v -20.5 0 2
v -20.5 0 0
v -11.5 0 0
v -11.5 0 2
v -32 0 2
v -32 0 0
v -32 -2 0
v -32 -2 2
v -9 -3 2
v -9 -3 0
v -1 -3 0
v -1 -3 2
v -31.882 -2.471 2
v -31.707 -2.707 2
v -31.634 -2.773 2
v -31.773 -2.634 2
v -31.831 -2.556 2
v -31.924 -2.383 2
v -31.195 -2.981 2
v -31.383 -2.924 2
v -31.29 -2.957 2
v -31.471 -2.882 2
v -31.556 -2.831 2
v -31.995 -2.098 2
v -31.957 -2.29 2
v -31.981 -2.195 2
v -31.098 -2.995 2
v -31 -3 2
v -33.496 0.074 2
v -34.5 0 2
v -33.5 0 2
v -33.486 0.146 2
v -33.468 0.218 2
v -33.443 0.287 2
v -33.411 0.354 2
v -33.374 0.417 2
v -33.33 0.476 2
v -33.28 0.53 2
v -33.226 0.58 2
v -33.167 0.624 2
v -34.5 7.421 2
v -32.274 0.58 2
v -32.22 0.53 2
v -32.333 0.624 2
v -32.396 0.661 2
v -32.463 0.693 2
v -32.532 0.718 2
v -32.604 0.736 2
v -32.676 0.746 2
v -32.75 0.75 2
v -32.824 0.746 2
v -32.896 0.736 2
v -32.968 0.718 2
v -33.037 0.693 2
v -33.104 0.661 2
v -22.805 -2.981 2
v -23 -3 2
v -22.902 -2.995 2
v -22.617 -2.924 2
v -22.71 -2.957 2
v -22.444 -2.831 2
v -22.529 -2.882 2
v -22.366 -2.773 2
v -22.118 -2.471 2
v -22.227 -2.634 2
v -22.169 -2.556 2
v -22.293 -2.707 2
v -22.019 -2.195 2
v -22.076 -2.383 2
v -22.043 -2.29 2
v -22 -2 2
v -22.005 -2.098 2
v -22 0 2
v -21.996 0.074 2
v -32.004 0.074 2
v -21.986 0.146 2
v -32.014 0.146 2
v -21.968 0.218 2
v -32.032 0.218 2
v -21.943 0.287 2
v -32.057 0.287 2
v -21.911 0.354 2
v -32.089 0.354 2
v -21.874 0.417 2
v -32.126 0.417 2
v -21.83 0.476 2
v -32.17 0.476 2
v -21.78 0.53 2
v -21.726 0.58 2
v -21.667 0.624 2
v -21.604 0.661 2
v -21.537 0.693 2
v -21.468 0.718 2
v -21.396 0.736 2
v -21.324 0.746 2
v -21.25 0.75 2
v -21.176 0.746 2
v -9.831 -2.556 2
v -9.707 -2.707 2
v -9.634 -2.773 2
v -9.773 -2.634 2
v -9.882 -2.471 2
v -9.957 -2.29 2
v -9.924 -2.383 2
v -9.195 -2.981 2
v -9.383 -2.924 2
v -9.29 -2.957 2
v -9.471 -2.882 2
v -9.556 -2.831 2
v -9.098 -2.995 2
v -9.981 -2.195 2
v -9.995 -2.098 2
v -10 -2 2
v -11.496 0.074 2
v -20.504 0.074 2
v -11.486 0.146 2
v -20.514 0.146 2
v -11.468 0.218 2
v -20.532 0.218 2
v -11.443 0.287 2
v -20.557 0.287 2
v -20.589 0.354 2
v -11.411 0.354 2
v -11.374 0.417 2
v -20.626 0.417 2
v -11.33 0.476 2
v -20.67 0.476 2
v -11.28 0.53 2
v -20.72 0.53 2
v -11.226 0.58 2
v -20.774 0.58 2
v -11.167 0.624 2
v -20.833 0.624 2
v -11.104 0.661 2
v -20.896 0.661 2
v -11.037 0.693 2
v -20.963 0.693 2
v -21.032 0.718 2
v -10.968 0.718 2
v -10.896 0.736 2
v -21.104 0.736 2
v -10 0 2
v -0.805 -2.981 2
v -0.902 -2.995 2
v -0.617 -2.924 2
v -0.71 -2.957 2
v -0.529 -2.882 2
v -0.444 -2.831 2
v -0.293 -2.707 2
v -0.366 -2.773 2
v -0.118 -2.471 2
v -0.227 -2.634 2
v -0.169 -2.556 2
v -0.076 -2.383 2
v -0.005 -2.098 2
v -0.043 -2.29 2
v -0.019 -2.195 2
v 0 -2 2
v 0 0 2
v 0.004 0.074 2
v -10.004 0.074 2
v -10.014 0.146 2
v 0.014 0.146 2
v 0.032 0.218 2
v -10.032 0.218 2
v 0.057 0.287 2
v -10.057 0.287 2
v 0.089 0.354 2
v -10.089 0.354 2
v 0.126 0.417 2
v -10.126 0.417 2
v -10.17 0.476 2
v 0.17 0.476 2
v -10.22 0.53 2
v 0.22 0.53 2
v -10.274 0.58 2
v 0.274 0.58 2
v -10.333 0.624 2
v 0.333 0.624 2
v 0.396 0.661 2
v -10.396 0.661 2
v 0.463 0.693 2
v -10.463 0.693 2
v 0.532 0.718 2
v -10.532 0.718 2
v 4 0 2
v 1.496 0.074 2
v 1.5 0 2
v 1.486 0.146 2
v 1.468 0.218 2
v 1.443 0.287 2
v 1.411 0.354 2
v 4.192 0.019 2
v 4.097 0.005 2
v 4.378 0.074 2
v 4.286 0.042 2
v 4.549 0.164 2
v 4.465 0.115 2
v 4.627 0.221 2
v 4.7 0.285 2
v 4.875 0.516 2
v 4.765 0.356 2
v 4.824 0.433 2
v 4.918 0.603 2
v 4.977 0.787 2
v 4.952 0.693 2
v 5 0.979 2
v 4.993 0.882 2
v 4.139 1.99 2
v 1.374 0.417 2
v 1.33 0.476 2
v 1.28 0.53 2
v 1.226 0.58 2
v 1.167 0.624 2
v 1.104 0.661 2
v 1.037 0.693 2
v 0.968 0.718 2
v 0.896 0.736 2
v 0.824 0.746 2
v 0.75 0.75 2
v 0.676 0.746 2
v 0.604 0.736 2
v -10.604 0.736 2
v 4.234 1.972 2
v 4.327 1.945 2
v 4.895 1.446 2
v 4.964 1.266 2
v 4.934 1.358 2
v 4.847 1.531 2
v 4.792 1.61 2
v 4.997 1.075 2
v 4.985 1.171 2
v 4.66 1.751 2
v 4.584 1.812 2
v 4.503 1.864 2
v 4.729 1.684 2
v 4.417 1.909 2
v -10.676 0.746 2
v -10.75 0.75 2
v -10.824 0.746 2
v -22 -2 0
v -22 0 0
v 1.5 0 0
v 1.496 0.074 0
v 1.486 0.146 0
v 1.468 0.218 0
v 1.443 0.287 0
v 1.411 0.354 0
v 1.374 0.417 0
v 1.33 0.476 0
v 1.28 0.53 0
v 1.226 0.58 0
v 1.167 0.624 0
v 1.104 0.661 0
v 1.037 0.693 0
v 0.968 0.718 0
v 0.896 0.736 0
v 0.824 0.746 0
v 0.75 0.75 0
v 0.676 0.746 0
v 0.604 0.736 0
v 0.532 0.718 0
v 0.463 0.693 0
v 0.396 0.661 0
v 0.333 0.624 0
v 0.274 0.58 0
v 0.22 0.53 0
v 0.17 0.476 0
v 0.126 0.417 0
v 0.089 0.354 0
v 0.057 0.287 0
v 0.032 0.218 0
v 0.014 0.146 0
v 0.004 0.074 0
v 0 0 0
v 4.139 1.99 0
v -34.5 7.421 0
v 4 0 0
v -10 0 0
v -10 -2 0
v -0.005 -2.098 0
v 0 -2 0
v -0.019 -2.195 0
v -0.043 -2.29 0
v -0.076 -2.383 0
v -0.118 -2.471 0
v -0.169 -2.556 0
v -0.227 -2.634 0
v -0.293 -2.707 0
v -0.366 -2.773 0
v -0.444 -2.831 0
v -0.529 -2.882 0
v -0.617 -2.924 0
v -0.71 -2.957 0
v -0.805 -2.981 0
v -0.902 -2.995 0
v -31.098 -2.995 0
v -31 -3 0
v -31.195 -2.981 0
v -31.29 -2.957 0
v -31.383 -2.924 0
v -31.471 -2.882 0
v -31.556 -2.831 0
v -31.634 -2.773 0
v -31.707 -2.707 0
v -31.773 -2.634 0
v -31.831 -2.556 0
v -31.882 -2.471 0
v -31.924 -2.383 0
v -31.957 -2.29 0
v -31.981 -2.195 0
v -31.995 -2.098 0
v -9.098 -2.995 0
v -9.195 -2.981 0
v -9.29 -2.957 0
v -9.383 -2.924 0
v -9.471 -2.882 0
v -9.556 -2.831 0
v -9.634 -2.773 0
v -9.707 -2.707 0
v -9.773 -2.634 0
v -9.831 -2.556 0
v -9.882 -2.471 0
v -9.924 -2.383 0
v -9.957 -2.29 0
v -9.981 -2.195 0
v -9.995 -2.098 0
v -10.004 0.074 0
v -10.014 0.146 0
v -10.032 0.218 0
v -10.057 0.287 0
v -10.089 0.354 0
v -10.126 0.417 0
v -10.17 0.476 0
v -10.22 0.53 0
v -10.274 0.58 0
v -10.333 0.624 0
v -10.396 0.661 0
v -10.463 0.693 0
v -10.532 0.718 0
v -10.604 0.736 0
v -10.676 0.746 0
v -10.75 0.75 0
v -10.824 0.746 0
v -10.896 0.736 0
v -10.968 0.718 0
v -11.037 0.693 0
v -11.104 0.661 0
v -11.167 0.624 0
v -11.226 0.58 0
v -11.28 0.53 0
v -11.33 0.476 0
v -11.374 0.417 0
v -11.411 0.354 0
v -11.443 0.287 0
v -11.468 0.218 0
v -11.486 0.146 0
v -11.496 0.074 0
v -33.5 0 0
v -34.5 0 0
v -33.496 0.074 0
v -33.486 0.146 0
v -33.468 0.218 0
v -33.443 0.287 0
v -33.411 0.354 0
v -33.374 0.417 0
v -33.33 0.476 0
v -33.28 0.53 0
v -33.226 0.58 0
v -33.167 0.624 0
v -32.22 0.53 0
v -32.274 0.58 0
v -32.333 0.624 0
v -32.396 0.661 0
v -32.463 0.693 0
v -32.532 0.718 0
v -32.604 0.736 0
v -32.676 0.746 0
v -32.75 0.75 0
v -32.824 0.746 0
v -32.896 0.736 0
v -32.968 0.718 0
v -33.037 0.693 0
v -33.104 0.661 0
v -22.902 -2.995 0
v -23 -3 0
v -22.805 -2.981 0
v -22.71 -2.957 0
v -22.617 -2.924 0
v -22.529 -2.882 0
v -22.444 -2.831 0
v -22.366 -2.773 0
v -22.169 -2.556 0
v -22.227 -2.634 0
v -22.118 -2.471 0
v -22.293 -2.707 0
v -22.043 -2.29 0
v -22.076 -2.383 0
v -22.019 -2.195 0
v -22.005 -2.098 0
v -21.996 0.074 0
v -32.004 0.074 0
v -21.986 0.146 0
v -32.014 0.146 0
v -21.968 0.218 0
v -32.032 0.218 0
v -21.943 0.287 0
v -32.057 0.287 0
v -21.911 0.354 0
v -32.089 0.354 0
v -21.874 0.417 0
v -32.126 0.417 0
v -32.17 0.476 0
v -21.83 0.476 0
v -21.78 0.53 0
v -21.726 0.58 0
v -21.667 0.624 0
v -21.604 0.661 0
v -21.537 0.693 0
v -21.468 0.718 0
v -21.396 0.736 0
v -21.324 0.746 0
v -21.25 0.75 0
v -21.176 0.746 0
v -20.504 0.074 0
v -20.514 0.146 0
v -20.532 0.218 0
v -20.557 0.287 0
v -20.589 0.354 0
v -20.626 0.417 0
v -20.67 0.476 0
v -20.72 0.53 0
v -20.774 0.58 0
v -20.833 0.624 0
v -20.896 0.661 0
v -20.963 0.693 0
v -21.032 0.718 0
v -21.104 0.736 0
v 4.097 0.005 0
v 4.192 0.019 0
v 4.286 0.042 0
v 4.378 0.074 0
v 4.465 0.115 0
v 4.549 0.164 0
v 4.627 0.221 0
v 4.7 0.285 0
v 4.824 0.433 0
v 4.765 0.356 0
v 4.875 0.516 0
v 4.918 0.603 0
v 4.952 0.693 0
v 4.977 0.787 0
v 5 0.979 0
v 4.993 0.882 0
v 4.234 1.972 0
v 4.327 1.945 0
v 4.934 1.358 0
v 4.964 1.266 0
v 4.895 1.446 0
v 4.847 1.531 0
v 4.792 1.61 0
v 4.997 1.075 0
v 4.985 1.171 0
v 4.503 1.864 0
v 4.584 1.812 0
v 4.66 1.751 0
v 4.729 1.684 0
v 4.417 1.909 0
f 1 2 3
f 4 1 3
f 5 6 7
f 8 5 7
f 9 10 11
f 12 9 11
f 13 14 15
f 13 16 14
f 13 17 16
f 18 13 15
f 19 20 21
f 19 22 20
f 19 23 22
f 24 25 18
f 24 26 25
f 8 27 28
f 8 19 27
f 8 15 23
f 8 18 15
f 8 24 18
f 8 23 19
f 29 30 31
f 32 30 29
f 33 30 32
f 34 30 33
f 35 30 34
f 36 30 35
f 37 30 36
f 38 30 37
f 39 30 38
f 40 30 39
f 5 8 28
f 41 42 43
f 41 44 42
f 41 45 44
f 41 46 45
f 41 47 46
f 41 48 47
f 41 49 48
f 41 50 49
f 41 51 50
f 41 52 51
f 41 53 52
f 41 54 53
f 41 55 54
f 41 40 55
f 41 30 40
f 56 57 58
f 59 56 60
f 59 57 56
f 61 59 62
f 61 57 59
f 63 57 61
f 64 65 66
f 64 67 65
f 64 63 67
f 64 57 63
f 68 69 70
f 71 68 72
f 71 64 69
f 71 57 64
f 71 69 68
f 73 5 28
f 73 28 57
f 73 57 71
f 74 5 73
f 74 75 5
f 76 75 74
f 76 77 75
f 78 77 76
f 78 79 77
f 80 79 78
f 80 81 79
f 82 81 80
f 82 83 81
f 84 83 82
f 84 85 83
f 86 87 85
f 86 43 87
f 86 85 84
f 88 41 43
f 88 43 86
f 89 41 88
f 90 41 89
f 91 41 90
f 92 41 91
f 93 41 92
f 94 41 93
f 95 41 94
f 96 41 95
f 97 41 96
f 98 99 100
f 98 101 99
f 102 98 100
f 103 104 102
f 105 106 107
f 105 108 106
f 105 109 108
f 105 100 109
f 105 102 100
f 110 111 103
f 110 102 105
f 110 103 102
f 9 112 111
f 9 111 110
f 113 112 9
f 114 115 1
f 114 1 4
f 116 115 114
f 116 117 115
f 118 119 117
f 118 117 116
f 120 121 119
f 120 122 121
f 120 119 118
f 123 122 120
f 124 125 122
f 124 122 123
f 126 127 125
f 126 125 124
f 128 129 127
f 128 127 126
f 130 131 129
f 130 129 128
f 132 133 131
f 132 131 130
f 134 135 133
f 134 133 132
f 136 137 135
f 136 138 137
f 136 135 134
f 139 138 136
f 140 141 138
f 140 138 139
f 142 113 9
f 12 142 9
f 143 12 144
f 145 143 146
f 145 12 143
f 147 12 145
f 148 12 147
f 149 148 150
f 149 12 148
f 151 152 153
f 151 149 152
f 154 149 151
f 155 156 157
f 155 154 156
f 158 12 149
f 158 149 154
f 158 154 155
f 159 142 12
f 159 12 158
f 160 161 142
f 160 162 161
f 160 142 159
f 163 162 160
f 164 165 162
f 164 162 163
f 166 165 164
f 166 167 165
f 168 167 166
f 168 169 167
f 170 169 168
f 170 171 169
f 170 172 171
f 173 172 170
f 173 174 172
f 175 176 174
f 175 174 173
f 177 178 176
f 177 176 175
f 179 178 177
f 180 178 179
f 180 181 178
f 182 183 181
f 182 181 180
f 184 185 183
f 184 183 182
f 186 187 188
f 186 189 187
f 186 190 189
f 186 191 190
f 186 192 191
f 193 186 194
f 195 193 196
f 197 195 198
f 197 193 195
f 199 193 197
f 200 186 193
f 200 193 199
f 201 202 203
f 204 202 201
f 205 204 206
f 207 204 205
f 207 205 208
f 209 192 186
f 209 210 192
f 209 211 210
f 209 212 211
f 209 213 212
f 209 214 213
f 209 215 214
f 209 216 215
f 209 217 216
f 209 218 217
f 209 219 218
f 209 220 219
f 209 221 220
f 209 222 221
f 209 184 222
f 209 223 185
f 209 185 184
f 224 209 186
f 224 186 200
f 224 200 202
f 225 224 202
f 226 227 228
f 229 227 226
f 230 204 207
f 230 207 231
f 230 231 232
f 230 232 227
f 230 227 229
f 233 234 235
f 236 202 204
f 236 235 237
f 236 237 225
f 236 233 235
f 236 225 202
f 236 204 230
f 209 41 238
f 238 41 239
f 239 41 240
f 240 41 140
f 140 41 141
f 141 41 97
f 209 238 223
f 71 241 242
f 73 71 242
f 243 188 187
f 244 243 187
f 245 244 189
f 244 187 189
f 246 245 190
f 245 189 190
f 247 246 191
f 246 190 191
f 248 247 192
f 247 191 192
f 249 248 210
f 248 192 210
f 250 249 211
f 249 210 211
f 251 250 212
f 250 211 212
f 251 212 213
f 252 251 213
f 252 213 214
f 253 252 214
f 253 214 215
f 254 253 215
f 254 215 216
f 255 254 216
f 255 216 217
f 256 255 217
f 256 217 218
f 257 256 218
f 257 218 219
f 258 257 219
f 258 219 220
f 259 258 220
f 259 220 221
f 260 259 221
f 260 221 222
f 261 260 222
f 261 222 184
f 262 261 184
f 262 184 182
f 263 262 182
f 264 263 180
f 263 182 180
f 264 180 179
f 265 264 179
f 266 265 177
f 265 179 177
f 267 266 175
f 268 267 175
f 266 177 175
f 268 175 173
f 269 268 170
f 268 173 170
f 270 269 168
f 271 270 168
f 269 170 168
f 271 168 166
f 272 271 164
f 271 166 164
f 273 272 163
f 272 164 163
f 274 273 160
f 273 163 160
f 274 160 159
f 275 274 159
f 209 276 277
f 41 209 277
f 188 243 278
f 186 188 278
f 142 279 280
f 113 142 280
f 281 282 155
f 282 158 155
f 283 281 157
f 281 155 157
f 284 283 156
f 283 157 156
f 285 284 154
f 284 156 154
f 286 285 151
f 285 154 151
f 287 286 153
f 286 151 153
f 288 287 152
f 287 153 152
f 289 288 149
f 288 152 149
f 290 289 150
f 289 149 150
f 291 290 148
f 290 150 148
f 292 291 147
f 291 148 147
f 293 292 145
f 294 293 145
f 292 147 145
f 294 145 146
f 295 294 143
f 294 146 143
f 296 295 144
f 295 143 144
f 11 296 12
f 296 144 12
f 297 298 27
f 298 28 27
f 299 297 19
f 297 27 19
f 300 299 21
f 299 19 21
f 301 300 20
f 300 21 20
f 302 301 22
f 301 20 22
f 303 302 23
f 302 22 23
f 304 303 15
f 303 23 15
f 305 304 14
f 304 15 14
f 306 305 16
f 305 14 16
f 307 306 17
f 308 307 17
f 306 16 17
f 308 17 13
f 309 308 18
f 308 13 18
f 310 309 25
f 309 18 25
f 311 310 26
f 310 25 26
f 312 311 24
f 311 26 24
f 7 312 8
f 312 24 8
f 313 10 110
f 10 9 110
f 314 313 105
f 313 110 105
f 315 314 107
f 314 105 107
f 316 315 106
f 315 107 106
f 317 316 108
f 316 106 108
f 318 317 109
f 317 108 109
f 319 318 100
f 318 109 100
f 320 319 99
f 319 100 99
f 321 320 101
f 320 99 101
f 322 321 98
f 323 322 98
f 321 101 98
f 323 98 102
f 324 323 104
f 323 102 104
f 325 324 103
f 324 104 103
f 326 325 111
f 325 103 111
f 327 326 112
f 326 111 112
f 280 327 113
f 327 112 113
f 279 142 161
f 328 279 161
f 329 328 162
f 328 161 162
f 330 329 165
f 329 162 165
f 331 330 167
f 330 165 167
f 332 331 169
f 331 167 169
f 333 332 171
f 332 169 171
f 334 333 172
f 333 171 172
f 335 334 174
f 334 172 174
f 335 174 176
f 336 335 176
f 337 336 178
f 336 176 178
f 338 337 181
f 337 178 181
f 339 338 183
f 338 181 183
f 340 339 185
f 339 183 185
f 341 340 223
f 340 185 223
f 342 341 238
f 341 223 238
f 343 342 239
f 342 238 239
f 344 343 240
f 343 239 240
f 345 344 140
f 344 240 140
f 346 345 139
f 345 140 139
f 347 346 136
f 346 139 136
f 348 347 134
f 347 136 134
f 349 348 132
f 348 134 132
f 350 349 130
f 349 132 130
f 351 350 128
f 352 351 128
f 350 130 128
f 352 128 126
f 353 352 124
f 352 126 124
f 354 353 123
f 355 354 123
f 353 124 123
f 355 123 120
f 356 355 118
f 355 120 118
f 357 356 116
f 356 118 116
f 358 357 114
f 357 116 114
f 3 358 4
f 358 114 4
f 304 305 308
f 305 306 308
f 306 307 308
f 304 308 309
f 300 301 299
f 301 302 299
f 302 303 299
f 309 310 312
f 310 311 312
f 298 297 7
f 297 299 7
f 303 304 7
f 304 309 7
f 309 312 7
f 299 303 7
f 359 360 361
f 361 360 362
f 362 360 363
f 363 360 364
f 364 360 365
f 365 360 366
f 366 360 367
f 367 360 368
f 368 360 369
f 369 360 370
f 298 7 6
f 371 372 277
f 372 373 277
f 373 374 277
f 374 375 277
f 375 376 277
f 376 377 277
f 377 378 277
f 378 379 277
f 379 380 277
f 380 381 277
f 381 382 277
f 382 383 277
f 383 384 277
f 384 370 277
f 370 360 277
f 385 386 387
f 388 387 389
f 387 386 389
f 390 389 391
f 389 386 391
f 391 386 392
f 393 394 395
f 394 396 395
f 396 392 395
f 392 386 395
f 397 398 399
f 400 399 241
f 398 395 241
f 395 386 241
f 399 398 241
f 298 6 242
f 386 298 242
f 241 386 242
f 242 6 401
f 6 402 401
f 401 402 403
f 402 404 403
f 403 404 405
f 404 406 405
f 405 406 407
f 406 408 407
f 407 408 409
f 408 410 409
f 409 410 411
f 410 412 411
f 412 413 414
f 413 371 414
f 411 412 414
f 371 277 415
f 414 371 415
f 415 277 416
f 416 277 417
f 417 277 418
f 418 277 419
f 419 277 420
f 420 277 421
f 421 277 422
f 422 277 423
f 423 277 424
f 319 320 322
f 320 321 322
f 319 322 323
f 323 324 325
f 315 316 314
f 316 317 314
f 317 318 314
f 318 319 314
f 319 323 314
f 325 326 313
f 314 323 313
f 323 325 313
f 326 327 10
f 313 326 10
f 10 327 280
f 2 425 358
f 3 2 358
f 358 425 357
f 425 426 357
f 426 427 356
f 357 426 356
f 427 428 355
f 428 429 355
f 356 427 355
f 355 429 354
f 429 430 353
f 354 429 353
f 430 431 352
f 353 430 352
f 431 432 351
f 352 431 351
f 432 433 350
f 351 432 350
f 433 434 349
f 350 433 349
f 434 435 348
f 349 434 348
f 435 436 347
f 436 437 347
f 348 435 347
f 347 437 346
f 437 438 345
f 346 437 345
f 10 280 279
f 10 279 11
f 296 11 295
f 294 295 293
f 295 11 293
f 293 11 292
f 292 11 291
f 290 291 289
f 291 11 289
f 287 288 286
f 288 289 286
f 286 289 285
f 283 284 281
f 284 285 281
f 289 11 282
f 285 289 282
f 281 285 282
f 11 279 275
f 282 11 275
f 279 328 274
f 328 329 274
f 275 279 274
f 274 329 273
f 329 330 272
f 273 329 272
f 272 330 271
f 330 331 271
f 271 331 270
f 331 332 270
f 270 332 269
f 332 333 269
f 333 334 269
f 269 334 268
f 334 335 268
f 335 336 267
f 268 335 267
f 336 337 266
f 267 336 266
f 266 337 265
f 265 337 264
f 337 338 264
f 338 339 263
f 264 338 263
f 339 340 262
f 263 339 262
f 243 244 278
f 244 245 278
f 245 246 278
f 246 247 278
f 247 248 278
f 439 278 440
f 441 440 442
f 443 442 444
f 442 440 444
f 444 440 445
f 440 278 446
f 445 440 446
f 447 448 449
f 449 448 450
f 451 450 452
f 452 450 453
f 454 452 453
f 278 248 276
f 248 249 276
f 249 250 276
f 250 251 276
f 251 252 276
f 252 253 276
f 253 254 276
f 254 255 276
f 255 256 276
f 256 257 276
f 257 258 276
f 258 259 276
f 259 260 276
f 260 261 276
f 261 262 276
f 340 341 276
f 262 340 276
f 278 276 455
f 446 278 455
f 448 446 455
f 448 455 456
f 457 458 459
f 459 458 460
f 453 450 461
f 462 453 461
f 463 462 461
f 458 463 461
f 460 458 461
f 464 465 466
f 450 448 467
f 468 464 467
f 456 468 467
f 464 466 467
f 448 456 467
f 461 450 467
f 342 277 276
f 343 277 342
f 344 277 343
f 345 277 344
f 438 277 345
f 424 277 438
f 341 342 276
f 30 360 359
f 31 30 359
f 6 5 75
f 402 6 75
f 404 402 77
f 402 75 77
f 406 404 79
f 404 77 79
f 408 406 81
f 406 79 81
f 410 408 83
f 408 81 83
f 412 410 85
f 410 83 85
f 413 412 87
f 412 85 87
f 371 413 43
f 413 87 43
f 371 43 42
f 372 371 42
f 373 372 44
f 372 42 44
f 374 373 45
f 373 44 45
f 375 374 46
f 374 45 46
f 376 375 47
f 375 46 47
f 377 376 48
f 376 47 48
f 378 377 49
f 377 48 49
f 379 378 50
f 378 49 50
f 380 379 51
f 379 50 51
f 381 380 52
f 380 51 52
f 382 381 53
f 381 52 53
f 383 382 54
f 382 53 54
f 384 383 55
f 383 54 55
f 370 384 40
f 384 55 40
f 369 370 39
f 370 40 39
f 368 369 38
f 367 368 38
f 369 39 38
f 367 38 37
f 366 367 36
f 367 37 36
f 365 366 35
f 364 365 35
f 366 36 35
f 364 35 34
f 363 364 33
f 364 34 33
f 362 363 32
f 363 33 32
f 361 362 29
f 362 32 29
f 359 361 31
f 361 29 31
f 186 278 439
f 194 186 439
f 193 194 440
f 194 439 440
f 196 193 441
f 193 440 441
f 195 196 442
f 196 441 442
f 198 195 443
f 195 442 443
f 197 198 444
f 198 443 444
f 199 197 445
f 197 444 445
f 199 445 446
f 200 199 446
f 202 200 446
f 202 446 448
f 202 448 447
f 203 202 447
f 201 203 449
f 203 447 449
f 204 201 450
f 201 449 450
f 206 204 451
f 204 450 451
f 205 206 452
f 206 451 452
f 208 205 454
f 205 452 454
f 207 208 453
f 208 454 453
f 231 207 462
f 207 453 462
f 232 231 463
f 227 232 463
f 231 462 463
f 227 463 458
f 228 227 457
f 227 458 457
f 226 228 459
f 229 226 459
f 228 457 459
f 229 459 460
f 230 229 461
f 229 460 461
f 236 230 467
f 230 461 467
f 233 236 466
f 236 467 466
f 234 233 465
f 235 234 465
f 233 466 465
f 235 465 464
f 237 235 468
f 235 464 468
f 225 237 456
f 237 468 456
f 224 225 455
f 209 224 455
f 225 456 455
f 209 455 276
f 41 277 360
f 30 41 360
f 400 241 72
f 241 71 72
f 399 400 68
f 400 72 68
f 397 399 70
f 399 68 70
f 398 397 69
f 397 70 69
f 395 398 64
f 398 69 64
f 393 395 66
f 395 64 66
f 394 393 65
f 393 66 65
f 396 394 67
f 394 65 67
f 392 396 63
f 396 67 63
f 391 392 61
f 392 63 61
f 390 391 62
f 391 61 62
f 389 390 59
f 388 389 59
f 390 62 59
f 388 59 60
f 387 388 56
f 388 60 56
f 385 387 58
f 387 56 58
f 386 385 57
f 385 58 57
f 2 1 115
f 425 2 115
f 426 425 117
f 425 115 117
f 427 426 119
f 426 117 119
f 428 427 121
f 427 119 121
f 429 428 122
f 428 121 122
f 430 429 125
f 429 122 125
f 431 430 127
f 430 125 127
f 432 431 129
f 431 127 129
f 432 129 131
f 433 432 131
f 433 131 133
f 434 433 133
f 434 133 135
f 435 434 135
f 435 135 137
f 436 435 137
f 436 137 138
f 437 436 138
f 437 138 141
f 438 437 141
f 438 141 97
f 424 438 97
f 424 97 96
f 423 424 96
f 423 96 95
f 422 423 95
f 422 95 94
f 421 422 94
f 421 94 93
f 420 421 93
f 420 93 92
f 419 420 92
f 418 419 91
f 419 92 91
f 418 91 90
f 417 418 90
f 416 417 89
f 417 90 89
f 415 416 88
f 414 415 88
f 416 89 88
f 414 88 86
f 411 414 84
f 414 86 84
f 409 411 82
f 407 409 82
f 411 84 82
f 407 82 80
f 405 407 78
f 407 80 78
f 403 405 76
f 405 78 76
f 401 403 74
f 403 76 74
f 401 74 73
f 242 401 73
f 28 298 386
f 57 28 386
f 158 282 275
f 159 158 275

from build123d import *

# Parameters (mm, degrees)
EXTRUDE_1_DEPTH     = 2
SKETCH_2_R          = 0.75
CUT_EXTRUDE_1_DEPTH = 36.34566511
FILLET_1_R          = 1


with BuildPart() as part:
    # 草图1 → 凸台-拉伸1 (new body)
    with BuildSketch(Plane.XY):
        with BuildLine():
            Line((4.139173101, 1.990268069), (-34.5, 7.420649709))
            Line((-34.5, 7.420649709), (-34.5, 0))
            Line((-34.5, 0), (-32, 0))
            Line((-32, 0), (-32, -3))
            Line((-32, -3), (-22, -3))
            Line((-22, -3), (-22, 0))
            Line((-22, 0), (-10, 0))
            Line((-10, 0), (-10, -3))
            Line((-10, -3), (0, -3))
            Line((0, -3), (0, 0))
            Line((0, 0), (4, 0))
            ThreePointArc((4, 0), (4.99756405, 0.930243526), (4.139173101, 1.990268069))
        make_face()
    extrude(amount=EXTRUDE_1_DEPTH)

    # 草图2 → 切除-拉伸1 (cut, through all)
    with BuildSketch(Plane.XY.offset(2)):
        with Locations((-32.75, 0)):
            Circle(SKETCH_2_R)
        with Locations((-21.25, 0)):
            Circle(SKETCH_2_R)
        with Locations((-10.75, 0)):
            Circle(SKETCH_2_R)
        with Locations((0.75, 0)):
            Circle(SKETCH_2_R)
    extrude(amount=-CUT_EXTRUDE_1_DEPTH, mode=Mode.SUBTRACT)

    # 圆角1
    fillet_1_edges = [part.edges().sort_by_distance(p)[0] for p in [
        (0, -3, 1),
        (-10, -3, 1),
        (-22, -3, 1),
        (-32, -3, 1),
    ]]
    fillet(fillet_1_edges, radius=FILLET_1_R)


solid = part.part
